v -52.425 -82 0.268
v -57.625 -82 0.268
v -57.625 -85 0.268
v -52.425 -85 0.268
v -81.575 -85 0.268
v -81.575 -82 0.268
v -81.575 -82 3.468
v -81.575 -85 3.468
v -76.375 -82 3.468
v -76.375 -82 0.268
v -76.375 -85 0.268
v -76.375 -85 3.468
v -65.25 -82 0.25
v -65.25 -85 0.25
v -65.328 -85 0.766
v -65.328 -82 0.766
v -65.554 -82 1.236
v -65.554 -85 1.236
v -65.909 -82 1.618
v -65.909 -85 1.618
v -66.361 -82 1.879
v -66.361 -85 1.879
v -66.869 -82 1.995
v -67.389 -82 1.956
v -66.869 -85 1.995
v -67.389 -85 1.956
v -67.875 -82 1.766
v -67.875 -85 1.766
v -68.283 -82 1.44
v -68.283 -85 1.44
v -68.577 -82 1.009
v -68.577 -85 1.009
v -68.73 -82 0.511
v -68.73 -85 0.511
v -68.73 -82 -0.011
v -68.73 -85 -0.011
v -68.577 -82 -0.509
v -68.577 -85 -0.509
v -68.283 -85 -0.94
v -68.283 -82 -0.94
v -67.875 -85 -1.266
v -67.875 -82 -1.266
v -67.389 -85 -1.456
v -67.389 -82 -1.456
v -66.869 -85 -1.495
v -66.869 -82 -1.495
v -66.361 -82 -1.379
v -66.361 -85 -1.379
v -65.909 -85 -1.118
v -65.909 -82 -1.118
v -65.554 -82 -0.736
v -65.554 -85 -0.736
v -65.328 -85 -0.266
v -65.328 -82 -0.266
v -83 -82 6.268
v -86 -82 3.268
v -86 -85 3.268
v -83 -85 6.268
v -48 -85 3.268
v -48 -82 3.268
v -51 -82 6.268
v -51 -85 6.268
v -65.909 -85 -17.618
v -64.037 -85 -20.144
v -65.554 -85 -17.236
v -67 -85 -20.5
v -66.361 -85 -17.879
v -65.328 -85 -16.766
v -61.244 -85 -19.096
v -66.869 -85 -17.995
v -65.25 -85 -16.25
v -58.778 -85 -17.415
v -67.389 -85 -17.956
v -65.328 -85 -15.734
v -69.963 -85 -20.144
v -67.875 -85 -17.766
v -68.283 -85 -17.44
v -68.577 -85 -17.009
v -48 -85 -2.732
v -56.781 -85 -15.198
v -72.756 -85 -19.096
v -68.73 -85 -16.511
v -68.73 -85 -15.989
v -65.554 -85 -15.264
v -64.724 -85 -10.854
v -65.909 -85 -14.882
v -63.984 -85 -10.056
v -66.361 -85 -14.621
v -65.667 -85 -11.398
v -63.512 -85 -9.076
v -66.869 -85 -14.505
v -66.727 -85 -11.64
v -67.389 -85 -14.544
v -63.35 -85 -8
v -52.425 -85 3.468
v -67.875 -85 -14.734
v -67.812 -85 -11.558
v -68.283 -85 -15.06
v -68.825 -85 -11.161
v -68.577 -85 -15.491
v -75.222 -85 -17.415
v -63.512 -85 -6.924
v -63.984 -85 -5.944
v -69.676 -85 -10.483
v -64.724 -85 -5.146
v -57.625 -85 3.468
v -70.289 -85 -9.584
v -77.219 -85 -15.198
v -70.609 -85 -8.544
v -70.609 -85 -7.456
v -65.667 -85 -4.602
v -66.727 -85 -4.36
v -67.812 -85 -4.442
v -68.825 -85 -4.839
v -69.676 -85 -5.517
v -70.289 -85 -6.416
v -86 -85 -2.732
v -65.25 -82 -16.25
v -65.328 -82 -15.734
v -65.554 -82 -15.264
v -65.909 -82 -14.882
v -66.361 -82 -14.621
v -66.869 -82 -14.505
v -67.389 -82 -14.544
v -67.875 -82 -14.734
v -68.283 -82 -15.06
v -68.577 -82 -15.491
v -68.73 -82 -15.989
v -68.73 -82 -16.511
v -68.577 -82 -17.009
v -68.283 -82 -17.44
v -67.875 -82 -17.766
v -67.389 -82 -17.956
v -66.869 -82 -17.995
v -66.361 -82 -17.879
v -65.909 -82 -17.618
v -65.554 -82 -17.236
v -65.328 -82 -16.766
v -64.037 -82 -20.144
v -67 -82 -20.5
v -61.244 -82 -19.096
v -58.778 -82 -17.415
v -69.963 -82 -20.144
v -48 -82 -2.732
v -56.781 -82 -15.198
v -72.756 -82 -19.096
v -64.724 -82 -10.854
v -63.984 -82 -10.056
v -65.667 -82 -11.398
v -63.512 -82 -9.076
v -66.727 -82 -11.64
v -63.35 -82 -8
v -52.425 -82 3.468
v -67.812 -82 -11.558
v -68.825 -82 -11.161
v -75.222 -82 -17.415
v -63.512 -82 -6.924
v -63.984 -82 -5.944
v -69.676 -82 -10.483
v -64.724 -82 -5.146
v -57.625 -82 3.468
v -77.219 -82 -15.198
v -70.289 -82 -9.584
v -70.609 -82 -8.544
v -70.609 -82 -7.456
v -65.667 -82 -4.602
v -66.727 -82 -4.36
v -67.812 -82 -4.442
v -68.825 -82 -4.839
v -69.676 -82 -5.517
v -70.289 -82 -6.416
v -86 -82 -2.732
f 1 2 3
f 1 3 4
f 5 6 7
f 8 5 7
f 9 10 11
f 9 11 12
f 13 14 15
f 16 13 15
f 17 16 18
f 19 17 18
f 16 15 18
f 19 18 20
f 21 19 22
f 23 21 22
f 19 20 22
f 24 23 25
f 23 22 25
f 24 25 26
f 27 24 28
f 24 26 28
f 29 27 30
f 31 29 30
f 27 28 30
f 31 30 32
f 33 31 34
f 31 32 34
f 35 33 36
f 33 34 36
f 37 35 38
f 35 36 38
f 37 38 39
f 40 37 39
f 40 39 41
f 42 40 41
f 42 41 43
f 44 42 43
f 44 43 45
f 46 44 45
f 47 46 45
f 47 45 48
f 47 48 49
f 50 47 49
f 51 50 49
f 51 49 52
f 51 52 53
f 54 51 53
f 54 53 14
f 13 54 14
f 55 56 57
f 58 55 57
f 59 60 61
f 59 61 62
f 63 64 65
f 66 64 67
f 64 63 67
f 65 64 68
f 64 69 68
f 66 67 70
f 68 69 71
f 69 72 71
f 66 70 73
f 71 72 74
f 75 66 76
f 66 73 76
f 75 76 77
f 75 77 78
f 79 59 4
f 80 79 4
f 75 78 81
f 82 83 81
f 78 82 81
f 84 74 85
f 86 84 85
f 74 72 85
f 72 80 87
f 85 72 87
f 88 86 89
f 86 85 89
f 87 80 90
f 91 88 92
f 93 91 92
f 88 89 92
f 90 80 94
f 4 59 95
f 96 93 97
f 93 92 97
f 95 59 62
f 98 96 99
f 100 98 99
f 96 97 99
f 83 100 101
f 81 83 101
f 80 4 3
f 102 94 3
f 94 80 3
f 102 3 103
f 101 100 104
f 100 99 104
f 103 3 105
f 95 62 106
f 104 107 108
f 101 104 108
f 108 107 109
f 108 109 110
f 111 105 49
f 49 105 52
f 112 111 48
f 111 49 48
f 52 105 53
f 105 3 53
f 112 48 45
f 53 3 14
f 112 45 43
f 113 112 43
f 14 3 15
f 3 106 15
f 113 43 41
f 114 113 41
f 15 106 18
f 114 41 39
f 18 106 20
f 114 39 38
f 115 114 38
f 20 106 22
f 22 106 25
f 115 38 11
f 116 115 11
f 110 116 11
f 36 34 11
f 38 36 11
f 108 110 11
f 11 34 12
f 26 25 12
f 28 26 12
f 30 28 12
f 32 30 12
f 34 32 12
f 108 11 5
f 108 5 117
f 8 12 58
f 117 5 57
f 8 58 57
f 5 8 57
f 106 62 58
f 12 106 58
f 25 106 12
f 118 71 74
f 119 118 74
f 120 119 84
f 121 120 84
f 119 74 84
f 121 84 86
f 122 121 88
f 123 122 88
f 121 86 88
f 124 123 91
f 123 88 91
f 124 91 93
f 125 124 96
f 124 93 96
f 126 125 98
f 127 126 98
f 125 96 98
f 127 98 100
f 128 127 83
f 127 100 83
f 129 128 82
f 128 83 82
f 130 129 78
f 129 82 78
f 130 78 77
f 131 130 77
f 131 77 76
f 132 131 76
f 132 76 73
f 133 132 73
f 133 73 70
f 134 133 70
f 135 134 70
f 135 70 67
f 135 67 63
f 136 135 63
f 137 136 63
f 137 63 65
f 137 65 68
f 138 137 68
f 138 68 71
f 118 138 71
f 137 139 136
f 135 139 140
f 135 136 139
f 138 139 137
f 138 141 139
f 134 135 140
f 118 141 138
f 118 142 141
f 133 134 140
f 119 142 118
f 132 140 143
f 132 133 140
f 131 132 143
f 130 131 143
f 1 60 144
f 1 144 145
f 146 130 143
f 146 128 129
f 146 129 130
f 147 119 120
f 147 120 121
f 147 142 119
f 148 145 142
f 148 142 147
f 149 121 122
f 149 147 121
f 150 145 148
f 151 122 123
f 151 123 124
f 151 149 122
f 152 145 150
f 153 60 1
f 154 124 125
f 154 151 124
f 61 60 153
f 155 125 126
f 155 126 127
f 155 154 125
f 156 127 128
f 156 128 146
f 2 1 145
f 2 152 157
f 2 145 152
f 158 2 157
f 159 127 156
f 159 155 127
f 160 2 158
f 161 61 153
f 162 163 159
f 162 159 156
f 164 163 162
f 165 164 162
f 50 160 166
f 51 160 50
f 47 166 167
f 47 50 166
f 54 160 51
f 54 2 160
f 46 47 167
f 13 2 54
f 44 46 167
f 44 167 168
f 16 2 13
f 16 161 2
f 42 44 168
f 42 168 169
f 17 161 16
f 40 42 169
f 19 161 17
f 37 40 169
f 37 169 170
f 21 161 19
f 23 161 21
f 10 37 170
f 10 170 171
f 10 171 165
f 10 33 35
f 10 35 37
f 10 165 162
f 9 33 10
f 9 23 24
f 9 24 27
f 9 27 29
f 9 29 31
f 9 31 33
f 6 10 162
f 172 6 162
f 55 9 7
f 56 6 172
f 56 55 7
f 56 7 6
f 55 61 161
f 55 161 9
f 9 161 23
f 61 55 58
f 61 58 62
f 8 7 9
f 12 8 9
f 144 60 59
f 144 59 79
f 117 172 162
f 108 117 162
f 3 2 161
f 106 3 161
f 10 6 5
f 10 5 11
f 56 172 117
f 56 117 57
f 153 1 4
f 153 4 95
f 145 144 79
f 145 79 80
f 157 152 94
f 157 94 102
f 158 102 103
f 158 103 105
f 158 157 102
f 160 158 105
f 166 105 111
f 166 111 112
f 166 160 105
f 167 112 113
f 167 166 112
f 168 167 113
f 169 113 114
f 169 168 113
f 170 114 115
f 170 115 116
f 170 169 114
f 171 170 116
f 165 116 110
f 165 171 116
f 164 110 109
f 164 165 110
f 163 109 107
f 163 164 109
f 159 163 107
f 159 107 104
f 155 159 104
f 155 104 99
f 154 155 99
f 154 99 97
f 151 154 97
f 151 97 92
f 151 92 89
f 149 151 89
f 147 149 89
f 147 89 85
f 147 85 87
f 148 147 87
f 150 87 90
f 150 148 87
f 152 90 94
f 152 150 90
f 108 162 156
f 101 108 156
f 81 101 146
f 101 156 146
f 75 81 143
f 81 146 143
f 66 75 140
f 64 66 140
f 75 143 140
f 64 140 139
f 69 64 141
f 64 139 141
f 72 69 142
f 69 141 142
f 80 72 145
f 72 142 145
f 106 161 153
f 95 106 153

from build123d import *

# Parameters (mm, degrees)
SKETCH003_R             = 3.65
SKETCH003_W             = 5.2
SKETCH003_H             = 3.2
PAD003_DEPTH            = 3
SKETCH009_R             = 1.75
POCKET004_DEPTH         = 3.001
CHAMFER_SIZE            = 3
BODY002_PLACEMENT_ANGLE = 90


with BuildPart() as part:
    # Sketch003 → Pad003 (new body)
    with BuildSketch(Plane.XY):
        with BuildLine():
            Line((-19, 14.267973), (19, 14.267973))
            Line((19, 14.267973), (19, 5.267973))
            Line((19, 5.267973), (10.219447, -7.198118))
            ThreePointArc((-10.219436, -7.198133), (9e-06, -12.5), (10.219447, -7.198118))
            Line((-19, 5.267973), (-10.219436, -7.198133))
            Line((-19, 5.267973), (-19, 14.267973))
        make_face()
        Circle(SKETCH003_R, mode=Mode.SUBTRACT)
        with Locations((-11.975, 9.867973)):
            Rectangle(SKETCH003_W, SKETCH003_H, mode=Mode.SUBTRACT)
        with Locations((11.975, 9.867973)):
            Rectangle(SKETCH003_W, SKETCH003_H, mode=Mode.SUBTRACT)
    extrude(amount=PAD003_DEPTH)

    # Sketch009 (on Face17 of Pad003) → Pocket004 (cut, through all)
    with BuildSketch(Plane.XY.offset(3)):
        with Locations((0, 8.25)):
            Circle(SKETCH009_R)
        with Locations((0, -8.25)):
            Circle(SKETCH009_R)
    extrude(amount=-POCKET004_DEPTH, mode=Mode.SUBTRACT)

    # Chamfer
    chamfer_edges = [part.edges().sort_by_distance(p)[0] for p in [
        (-19, 14.267973, 1.5),
        (19, 14.267973, 1.5),
    ]]
    chamfer(chamfer_edges, length=CHAMFER_SIZE)


with BuildPart() as part_1:
    # Body002 placement: moved
    add(part.part.moved(Location((-67, -82, -8))).rotate(Axis((-67, -82, -8), (1, 0, 0)), BODY002_PLACEMENT_ANGLE))


solid = part_1.part
